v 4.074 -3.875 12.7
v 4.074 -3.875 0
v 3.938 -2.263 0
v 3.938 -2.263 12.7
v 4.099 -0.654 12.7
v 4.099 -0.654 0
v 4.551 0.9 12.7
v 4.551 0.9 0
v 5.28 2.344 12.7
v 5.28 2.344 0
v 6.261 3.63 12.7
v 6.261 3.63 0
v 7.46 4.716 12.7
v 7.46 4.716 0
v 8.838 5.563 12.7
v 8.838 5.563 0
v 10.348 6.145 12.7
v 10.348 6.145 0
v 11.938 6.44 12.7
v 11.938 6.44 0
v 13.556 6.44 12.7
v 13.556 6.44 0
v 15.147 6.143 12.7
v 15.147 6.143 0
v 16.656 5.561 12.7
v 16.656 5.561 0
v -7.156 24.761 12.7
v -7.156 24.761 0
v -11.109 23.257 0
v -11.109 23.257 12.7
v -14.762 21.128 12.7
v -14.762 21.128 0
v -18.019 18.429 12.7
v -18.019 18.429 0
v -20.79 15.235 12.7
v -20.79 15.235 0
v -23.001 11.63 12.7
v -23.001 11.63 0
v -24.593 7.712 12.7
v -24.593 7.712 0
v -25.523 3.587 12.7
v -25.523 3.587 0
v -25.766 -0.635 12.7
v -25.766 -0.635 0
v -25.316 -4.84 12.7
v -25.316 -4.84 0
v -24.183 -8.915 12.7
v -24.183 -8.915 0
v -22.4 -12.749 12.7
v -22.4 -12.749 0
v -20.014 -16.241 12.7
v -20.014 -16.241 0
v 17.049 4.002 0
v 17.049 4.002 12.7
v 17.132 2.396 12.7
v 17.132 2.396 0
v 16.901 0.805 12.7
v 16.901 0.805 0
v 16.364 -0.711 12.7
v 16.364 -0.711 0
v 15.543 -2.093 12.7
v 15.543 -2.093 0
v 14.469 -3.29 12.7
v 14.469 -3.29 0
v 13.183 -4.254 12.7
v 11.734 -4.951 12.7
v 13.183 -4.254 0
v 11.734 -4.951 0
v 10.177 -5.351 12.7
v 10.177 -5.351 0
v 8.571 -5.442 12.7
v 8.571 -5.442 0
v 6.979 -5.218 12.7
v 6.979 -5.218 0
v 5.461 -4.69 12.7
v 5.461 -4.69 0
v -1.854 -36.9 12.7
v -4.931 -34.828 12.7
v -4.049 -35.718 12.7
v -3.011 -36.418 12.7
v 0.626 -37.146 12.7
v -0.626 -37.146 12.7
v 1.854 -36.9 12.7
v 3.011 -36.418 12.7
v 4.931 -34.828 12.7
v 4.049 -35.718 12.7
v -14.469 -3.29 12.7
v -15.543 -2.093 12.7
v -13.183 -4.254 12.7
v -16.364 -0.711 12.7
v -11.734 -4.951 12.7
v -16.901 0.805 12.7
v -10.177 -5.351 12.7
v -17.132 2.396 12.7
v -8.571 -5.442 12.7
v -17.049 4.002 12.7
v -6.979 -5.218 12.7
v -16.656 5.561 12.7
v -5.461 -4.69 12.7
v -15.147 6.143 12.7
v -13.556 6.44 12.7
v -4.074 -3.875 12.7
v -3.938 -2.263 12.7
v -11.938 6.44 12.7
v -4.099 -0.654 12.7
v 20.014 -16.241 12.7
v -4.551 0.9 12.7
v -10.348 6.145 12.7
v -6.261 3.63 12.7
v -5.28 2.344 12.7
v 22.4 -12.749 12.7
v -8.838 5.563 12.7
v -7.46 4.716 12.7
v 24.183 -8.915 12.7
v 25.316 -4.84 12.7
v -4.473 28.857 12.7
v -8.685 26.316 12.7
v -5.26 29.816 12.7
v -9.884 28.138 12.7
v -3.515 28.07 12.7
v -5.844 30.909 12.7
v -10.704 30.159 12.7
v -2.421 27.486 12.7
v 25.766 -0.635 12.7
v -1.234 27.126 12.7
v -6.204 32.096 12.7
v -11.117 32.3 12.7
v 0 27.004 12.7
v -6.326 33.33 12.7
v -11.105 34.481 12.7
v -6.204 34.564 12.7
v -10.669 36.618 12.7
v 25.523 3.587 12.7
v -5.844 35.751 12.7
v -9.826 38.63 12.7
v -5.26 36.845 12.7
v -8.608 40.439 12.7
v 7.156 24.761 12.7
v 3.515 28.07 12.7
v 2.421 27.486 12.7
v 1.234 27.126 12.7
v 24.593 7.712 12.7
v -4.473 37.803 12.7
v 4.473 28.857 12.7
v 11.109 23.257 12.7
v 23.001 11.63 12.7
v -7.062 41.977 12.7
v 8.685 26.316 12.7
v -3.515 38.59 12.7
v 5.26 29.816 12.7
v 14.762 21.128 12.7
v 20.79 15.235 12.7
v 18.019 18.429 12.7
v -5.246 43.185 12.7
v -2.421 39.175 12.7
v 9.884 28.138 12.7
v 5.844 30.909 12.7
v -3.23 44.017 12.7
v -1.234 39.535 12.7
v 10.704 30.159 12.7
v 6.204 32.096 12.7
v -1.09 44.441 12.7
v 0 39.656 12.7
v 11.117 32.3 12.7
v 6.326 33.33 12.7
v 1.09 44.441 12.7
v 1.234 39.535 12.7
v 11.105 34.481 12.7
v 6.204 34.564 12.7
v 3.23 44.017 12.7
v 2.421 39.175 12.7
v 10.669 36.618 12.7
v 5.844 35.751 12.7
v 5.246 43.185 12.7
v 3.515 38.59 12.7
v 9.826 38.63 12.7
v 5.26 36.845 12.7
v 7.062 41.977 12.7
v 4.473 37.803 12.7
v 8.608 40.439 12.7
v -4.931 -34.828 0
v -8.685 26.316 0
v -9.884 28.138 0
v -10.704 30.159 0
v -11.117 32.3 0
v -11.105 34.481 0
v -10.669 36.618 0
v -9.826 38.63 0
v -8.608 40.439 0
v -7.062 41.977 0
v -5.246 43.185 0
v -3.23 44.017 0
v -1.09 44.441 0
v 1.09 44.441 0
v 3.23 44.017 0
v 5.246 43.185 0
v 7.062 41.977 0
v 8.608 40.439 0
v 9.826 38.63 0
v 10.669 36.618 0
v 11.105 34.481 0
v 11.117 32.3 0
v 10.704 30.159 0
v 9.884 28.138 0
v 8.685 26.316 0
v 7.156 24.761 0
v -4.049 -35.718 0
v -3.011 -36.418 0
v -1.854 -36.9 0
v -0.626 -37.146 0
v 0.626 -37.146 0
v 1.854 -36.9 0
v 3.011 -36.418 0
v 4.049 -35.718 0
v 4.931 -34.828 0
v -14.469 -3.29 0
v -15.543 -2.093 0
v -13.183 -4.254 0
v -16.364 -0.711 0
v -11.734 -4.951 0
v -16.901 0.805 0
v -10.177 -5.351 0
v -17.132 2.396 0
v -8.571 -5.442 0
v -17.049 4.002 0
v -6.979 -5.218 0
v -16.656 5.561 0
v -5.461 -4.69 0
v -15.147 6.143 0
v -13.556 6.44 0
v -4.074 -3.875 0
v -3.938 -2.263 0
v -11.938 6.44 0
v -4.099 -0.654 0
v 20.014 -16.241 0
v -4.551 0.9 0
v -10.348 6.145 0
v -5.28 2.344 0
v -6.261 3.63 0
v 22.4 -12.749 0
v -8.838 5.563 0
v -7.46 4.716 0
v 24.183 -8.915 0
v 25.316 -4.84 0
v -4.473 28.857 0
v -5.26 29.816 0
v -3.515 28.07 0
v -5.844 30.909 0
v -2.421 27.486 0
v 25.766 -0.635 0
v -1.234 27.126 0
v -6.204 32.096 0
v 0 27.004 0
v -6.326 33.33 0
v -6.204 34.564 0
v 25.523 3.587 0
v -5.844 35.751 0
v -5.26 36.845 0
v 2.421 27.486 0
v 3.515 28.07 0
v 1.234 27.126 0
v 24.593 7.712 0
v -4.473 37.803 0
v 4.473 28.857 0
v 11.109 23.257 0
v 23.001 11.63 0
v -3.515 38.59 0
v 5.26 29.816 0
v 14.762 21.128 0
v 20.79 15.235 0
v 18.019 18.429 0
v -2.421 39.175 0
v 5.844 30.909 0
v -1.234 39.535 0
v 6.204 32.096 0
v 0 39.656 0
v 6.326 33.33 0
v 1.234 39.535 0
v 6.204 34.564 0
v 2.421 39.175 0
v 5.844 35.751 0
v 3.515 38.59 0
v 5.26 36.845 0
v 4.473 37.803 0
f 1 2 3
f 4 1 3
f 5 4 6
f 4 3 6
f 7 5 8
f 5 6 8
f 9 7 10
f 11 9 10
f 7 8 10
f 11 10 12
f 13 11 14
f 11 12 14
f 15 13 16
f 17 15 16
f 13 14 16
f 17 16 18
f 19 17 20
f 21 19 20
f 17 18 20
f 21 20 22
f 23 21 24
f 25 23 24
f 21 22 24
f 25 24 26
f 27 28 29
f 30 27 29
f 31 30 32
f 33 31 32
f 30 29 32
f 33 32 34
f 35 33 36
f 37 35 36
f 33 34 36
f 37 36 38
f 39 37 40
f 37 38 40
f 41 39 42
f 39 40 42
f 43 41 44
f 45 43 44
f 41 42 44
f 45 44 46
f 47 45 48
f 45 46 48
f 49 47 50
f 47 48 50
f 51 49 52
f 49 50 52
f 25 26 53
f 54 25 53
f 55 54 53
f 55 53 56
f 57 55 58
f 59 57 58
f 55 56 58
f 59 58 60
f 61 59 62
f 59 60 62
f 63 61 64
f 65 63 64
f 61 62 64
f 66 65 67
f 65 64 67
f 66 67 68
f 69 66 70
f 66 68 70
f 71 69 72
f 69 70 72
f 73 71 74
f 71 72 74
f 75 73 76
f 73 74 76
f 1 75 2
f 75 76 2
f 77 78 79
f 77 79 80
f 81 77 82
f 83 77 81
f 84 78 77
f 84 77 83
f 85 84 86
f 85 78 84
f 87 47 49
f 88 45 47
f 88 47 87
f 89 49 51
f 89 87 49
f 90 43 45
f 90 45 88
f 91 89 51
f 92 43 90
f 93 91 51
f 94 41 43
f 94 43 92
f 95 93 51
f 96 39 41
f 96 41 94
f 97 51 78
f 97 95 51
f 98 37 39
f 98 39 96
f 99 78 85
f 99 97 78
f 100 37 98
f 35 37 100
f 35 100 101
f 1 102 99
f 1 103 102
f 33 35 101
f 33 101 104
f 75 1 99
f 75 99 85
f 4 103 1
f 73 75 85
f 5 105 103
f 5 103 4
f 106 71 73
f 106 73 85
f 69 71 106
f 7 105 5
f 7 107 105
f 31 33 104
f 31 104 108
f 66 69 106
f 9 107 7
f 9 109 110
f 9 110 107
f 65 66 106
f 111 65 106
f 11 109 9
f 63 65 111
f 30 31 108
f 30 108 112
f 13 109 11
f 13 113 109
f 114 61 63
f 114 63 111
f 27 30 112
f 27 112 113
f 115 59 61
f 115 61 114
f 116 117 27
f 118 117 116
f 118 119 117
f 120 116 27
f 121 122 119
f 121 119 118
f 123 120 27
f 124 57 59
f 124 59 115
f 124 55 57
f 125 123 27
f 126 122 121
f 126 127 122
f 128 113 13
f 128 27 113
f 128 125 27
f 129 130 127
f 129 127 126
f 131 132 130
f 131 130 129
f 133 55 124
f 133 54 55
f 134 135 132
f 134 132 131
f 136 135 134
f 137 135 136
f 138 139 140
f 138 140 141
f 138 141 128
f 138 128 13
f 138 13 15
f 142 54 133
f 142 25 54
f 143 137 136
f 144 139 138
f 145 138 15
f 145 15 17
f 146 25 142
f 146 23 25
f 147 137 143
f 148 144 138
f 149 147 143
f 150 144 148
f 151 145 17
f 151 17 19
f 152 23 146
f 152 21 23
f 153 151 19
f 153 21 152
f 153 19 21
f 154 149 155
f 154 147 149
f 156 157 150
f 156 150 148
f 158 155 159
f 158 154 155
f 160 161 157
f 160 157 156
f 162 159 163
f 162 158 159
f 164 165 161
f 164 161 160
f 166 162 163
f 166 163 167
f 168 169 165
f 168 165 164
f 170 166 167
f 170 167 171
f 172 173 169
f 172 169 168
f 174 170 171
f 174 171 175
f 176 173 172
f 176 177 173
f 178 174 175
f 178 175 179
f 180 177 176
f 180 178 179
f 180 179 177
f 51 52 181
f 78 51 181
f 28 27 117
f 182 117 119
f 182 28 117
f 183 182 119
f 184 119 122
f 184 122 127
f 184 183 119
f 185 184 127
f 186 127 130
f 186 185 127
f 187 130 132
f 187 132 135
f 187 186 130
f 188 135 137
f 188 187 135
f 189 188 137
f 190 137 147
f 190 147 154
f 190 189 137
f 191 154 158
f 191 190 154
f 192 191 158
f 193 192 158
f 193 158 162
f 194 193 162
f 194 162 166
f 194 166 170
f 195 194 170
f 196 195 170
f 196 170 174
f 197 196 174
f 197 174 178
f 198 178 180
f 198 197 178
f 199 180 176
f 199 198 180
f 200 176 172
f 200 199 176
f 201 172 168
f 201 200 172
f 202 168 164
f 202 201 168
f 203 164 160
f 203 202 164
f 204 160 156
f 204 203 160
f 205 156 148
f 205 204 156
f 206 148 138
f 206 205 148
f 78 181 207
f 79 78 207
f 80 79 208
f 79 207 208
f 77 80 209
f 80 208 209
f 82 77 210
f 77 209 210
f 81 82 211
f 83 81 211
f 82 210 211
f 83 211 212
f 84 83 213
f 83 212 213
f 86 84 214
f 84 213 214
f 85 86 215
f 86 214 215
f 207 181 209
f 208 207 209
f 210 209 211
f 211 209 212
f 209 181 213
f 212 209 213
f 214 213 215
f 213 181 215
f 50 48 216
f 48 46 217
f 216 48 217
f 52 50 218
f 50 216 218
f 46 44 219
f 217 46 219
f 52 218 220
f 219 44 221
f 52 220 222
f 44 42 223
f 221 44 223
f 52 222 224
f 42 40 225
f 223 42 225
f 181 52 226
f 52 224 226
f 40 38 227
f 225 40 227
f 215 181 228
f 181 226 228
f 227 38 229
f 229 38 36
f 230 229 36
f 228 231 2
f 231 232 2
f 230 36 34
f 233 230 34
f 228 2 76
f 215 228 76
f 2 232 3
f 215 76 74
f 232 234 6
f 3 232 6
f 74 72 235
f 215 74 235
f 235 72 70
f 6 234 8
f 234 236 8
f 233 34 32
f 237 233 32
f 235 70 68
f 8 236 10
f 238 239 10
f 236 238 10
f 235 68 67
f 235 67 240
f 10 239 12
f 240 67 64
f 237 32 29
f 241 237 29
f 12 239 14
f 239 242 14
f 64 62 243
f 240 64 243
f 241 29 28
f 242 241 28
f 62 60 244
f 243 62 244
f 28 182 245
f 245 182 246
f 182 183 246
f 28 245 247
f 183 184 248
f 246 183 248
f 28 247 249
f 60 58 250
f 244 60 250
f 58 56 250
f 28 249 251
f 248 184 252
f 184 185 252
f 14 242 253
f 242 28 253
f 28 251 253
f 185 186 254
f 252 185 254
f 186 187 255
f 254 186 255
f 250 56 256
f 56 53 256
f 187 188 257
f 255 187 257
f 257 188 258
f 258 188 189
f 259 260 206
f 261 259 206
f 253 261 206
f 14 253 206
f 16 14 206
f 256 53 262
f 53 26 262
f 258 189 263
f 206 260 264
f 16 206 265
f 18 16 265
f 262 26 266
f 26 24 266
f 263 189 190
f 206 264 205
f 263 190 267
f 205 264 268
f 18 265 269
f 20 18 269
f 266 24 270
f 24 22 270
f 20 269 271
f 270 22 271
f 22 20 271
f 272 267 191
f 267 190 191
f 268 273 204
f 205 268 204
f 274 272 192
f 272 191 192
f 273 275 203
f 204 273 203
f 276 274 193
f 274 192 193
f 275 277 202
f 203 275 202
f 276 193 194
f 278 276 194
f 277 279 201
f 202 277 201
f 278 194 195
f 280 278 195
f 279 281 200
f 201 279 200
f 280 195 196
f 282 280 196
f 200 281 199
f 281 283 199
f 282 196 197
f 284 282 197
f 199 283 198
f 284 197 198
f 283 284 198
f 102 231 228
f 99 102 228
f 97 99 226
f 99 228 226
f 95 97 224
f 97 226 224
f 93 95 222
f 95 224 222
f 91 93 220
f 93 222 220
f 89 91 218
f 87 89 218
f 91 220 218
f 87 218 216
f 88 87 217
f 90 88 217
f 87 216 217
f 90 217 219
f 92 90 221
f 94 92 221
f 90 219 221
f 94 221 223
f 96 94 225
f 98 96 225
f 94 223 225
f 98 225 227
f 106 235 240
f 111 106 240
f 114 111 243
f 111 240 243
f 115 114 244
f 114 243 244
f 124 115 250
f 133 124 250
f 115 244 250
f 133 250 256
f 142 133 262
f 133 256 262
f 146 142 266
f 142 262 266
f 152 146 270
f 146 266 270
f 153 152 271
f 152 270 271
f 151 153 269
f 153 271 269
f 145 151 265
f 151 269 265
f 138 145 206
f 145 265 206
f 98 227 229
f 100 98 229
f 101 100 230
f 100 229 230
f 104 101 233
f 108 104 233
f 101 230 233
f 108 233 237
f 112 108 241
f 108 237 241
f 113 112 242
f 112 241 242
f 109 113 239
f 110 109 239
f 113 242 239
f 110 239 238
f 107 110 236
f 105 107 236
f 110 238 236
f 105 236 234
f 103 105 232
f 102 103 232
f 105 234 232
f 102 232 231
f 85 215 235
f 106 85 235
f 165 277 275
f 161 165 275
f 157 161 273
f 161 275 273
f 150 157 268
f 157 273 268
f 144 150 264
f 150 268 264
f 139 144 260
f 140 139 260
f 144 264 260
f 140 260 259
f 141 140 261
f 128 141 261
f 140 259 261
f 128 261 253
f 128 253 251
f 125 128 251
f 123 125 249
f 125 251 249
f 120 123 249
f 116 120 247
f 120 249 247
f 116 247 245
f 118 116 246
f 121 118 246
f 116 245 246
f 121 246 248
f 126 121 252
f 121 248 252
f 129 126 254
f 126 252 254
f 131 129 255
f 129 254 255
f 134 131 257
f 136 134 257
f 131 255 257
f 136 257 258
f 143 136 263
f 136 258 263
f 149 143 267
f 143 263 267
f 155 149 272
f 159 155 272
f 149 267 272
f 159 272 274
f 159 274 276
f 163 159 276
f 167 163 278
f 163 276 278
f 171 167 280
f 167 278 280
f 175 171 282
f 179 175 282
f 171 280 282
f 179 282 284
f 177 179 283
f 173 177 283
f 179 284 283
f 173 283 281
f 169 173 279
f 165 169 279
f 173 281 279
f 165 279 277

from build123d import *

# Parameters (mm, degrees)
F1_DEPTH = 12.7
F2_R     = 6.325984
F3_DEPTH = 12.7


with BuildPart() as f1:
    # F0 (on Top) → F1 (new body)
    with BuildSketch(Plane.XY):
        with BuildLine():
            Line((4.930796, -34.827771), (20.013764, -16.240678))
            ThreePointArc((20.013764, -16.240678), (0, 25.774219), (-20.013764, -16.240678))
            Line((-20.013764, -16.240678), (-4.930796, -34.827771))
            ThreePointArc((-4.930796, -34.827771), (0, -37.176552), (4.930796, -34.827771))
        make_face()
        with BuildLine():
            ThreePointArc((-16.655875, 5.560721), (-7.460285, 4.715734), (-4.074331, -3.875436))
            ThreePointArc((-4.074331, -3.875436), (-13.849756, -3.803562), (-16.655875, 5.560721))
        make_face(mode=Mode.SUBTRACT)
        with BuildLine():
            ThreePointArc((16.655875, 5.560721), (13.849756, -3.803562), (4.074331, -3.875436))
            ThreePointArc((4.074331, -3.875436), (7.460285, 4.715734), (16.655875, 5.560721))
        make_face(mode=Mode.SUBTRACT)
    extrude(amount=F1_DEPTH)

    # F2 (on face) → F3 (join)
    with BuildSketch(Plane(origin=(0, 0, 0), x_dir=(1, 0, 0), z_dir=(0, 0, -1))):
        with BuildLine():
            ThreePointArc((7.156011, -24.760894), (0, -25.774219), (-7.156011, -24.760894))
            ThreePointArc((-7.156011, -24.760894), (0, -44.494381), (7.156011, -24.760894))
        make_face()
        with Locations((0, -33.330135)):
            Circle(F2_R, mode=Mode.SUBTRACT)
    extrude(amount=-F3_DEPTH)


solid = f1.part
